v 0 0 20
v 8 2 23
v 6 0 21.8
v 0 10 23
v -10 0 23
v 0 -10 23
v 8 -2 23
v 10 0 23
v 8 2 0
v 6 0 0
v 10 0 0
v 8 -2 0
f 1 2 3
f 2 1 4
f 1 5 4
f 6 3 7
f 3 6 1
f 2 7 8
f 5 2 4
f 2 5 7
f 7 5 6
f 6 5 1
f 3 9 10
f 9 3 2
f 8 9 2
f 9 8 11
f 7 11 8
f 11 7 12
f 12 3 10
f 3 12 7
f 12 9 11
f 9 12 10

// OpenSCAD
translate([0,0,20]) {
	cylinder(r1=0, r2=10, h=3, $fn=4);
}
translate([8,0,0]) {
	cylinder(r=2, h=23, $fn=4);
}
